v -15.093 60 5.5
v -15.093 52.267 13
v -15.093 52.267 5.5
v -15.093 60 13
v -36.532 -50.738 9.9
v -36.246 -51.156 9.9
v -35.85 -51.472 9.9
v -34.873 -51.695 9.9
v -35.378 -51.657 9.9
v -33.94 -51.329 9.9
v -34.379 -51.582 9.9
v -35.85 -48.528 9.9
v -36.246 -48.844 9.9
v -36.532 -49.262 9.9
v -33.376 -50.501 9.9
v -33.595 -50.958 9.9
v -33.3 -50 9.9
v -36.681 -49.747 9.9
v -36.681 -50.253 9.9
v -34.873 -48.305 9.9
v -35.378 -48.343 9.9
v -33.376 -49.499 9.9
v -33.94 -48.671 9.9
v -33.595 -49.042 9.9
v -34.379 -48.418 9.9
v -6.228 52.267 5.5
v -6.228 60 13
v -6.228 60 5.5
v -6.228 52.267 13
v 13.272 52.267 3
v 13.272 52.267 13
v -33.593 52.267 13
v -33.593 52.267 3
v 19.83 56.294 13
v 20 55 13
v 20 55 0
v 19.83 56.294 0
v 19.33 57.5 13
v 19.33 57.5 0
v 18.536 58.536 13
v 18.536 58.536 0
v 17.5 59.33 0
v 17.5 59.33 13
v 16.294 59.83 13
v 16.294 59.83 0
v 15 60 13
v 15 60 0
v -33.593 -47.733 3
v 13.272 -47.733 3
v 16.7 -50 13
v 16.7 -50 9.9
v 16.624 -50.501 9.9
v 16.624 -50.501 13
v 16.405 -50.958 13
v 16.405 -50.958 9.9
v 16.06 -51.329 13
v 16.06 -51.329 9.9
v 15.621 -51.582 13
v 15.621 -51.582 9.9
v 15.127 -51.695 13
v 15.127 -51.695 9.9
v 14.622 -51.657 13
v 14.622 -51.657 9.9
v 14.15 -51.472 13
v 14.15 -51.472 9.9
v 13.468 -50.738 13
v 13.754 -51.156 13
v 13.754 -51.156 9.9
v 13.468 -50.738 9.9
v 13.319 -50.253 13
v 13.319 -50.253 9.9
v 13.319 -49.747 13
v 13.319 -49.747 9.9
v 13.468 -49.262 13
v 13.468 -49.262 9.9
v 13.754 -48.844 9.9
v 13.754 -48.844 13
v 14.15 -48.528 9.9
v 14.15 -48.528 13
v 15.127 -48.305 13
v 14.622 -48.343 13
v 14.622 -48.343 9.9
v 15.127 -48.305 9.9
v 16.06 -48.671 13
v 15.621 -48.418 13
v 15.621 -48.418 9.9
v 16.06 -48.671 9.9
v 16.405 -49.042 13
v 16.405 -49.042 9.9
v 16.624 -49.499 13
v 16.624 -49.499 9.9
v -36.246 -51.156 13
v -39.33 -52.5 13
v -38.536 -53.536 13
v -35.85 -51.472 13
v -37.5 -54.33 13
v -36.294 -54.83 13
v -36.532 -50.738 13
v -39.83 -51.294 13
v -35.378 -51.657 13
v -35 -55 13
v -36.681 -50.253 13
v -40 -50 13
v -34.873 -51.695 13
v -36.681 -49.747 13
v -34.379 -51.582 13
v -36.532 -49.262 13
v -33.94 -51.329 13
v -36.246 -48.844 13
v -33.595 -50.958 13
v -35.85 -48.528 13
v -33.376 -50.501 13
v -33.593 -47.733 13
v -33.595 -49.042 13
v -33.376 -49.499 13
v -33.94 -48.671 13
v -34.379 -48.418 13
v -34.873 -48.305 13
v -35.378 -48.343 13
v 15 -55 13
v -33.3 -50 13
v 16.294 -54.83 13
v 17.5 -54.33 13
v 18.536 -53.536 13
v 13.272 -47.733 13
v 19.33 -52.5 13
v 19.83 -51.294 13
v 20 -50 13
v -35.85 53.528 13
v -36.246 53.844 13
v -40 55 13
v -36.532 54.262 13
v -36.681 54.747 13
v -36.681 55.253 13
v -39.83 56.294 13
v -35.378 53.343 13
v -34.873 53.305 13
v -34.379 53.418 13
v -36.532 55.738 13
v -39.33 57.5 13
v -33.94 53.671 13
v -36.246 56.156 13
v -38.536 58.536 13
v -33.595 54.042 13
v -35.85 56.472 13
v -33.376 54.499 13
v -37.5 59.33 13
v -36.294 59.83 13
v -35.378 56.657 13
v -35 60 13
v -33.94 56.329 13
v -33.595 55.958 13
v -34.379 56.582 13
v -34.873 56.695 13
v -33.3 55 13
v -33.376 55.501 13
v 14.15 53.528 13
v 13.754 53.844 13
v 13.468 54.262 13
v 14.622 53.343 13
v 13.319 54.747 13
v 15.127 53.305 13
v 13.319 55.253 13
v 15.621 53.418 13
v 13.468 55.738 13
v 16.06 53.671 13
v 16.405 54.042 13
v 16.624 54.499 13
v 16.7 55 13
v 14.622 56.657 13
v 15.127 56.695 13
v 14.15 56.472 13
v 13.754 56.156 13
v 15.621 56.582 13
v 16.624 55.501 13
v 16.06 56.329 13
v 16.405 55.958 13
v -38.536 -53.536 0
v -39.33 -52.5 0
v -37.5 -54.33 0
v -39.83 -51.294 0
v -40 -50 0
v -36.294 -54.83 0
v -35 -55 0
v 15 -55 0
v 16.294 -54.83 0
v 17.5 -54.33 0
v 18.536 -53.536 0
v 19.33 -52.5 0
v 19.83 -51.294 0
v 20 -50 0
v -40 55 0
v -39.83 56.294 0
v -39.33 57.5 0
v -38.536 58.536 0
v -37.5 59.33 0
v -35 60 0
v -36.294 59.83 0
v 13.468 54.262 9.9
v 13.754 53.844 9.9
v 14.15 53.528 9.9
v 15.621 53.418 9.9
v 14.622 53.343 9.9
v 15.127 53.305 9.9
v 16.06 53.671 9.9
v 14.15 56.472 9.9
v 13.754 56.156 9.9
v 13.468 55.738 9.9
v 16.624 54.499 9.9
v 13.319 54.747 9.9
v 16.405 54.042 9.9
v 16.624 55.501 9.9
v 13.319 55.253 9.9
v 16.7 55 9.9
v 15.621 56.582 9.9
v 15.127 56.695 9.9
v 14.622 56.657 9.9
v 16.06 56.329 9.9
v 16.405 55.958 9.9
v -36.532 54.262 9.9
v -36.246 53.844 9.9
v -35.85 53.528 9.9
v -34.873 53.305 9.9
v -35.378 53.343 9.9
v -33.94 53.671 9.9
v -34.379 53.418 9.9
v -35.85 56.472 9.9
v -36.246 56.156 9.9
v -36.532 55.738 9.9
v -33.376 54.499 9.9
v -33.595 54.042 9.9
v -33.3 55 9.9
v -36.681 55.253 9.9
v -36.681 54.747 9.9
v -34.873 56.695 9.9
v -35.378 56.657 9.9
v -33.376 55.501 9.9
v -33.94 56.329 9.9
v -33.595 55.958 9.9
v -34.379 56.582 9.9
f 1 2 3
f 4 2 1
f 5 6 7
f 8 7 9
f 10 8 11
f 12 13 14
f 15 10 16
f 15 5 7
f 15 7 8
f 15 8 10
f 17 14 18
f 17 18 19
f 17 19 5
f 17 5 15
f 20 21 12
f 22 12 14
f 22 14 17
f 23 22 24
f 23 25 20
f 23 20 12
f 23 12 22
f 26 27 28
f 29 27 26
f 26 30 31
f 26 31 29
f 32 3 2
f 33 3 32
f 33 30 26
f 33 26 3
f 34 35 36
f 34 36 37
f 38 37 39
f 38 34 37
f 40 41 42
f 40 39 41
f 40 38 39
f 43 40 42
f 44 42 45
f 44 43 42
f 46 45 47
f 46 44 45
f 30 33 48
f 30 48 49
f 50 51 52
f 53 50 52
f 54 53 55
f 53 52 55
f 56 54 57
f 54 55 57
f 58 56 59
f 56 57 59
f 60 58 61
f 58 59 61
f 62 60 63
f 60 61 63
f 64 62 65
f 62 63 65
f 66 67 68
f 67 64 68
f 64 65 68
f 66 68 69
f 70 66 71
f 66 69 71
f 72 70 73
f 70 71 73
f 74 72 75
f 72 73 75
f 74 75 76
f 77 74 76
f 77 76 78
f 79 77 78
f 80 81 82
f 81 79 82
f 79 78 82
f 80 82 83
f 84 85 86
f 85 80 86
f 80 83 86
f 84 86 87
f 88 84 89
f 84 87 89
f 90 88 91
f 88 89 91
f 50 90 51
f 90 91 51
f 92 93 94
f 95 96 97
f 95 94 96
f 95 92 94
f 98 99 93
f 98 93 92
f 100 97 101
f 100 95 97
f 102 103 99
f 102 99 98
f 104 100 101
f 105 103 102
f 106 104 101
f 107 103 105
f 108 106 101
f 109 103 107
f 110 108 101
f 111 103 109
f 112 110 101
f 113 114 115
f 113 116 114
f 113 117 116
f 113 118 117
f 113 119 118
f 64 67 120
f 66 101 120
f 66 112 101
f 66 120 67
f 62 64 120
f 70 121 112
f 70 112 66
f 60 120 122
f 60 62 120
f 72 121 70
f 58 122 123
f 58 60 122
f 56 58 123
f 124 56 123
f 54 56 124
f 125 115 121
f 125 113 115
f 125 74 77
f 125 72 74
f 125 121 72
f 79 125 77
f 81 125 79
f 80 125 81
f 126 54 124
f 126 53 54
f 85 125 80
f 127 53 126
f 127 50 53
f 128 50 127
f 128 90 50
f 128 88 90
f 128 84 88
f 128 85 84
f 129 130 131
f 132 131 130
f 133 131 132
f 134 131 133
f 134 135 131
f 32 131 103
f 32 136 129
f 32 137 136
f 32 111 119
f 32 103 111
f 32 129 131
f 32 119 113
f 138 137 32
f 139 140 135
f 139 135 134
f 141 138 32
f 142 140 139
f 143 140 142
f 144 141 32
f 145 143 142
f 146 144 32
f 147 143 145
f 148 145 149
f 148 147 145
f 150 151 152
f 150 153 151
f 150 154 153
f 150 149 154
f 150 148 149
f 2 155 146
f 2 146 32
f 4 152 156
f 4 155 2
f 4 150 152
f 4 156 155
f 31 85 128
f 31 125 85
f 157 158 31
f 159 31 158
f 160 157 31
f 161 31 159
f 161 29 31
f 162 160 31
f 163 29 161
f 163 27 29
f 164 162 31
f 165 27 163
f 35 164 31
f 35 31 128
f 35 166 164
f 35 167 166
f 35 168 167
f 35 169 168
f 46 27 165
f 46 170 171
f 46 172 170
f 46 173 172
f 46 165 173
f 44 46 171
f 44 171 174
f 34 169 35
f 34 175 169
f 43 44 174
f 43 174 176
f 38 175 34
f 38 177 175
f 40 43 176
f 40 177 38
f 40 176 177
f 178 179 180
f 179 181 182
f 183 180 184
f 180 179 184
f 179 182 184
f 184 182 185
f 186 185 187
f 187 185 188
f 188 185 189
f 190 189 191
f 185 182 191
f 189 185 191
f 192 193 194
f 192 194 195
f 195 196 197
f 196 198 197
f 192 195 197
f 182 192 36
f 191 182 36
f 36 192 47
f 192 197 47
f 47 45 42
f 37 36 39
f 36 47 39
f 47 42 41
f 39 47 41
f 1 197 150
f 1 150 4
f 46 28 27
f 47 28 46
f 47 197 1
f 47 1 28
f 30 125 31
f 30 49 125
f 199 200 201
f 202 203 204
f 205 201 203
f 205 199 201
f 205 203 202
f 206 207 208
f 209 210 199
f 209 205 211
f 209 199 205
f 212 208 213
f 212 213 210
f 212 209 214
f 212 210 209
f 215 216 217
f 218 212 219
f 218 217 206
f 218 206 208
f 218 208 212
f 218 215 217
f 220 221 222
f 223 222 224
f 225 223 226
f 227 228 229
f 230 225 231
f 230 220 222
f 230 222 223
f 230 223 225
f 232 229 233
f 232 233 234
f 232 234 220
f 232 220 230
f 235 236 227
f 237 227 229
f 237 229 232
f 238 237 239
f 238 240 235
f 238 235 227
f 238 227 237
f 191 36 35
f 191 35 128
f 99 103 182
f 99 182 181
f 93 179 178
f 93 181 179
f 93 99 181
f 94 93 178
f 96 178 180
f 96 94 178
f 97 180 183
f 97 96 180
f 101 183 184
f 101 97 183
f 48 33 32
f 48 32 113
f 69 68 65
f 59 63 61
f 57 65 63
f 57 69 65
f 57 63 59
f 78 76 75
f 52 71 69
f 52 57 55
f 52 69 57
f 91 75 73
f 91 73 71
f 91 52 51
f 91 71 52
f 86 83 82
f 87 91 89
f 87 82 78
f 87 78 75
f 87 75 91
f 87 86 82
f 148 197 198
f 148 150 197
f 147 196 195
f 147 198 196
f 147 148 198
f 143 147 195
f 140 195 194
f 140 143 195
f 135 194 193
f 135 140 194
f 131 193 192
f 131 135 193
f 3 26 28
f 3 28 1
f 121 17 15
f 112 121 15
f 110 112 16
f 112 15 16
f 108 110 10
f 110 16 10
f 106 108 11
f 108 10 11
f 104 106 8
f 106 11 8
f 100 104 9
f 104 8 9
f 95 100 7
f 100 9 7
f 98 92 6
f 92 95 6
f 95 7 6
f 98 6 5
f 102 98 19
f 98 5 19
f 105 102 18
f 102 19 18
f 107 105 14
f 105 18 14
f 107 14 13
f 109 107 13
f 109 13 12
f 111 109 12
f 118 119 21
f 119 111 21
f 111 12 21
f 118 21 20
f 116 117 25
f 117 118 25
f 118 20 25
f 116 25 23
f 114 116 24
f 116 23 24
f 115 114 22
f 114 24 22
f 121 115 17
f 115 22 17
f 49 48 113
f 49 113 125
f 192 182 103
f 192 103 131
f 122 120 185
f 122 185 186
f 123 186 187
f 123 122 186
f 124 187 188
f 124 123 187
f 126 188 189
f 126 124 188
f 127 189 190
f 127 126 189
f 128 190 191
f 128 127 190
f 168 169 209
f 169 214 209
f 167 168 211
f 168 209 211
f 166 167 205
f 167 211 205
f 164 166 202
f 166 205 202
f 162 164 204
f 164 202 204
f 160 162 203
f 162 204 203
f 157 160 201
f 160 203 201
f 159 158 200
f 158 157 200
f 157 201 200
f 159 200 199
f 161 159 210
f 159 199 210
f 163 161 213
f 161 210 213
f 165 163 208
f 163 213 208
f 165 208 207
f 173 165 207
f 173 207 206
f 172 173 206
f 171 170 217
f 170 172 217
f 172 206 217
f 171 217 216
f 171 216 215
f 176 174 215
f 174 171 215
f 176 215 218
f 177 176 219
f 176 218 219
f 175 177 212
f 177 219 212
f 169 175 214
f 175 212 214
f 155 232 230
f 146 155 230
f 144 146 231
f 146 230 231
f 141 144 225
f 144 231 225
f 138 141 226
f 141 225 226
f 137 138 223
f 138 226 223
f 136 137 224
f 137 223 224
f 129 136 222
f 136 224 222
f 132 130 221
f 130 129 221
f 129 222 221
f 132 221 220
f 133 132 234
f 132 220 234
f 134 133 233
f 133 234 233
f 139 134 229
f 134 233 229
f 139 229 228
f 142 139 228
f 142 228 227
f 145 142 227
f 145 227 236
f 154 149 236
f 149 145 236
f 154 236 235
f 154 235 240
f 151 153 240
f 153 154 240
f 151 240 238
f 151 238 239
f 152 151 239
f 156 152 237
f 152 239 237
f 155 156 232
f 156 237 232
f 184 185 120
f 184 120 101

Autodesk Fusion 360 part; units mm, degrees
sketch "Esboço1" plane through (0, 0, 0) normal (0, 0, 1) x (1, 0, 0) in component "Case"
sketch "Esboço1 (2)" plane through (0, 0, 0) normal (0, 0, 1) x (1, 0, 0) in component "Component"
  line L0 (-33.5931, -47.7327) -> (13.2718, -47.7327)
  line L1 (13.2718, -47.7327) -> (13.2718, 52.2673)
  line L2 (13.2718, 52.2673) -> (-33.5931, 52.2673)
  line L3 (-33.5931, 52.2673) -> (-33.5931, -47.7327)
  line L4 (-40, 60) -> (20, 60)
  line L5 (20, 60) -> (20, -55)
  line L6 (20, -55) -> (-40, -55)
  line L7 (-40, -55) -> (-40, 60)
  circle A0 centre (-35, -50) radius 1.7
  circle A1 centre (15, -50) radius 1.7
  circle A2 centre (-35, 55) radius 1.7
  circle A3 centre (15, 55) radius 1.7
  dimension "d1" = 100
  dimension "d2" = 46.8649
  dimension "d5" = 5
  dimension "d6" = 5
  dimension "d7" = 5
  dimension "d8" = 5
  dimension "d9" = 5
  dimension "d10" = 5
  dimension "d11" = 5
  dimension "d12" = 5
  dimension "d13" = 60
  dimension "d14" = 115
extrude "Extrusão1" add sketch "Esboço1 (2)" along normal blind 9.9 contours A0 | A1 | A2 | A3 makes body 1 at (-35.7756, -48.4872, 6.6) makes body 2 at (-35.7756, 56.5128, 6.6) makes body 3 at (16.5665, -49.3397, 6.6) makes body 4 at (16.5665, 55.6603, 6.6) in component "Component"
extrude "Extrusão2" add sketch "Esboço1 (2)" along normal blind 13 bodies 1 2 3 4 in component "Component"
extrude "Extrusão3" add sketch "Esboço1 (2)" along normal blind 3 contours L0 L1 L2 L3 bodies 1 in component "Component"
sketch "Esboço2" plane through (0, 0, 13) normal (0, 0, 1) x (-1, 0, 0) in component "Component"
  circle A0 centre (-15, -55) radius 1.7
  line L0 (33.5931, 47.7327) -> (33.5931, -52.2673)
  line L1 (33.5931, -52.2673) -> (-13.2718, -52.2673)
  line L2 (-13.2718, -52.2673) -> (-13.2718, 47.7327)
  line L3 (-13.2718, 47.7327) -> (33.5931, 47.7327)
  circle A1 centre (35, 50) radius 1.7
  circle A2 centre (-15, 50) radius 1.7
  circle A3 centre (35, -55) radius 1.7
  line L4 (40, 55) -> (-20, 55)
  line L5 (-20, 55) -> (-20, -60)
  line L6 (-20, -60) -> (40, -60)
  line L7 (40, -60) -> (40, 55)
  line L8 (15.0931, -60) -> (6.2282, -60)
  line L9 (6.2282, -60) -> (6.2282, -52.2673)
  line L10 (6.2282, -52.2673) -> (15.0931, -52.2673)
  line L11 (15.0931, -52.2673) -> (15.0931, -60)
  dimension "d21" = 18.5
  dimension "d22" = 19.5
extrude "Extrusão4" cut sketch "Esboço2" against normal blind 7.5 contours L1 L6 L8 L9 L10 L11 bodies 1 in component "Component"
fillet "Arredondamento1" radius 5 1 edges at (20, -55, 6.5) on bodies 1 in component "Component"
fillet "Arredondamento2" radius 5 1 edges at (-40, -55, 6.5) on bodies 1 in component "Component"
fillet "Arredondamento3" radius 5 1 edges at (-40, 60, 6.5) on bodies 1 in component "Component"
fillet "Arredondamento4" radius 5 1 edges at (20, 60, 6.5) on bodies 1 in component "Component"
component "Case" placed x (1, 0, 0) y (0, 1, 0) z (0, 0, 1) at (0, 0, 0)
component "Component" placed x (1, 0, 0) y (0, 1, 0) z (0, 0, 1) at (0, 0, 0) in component "Case"
